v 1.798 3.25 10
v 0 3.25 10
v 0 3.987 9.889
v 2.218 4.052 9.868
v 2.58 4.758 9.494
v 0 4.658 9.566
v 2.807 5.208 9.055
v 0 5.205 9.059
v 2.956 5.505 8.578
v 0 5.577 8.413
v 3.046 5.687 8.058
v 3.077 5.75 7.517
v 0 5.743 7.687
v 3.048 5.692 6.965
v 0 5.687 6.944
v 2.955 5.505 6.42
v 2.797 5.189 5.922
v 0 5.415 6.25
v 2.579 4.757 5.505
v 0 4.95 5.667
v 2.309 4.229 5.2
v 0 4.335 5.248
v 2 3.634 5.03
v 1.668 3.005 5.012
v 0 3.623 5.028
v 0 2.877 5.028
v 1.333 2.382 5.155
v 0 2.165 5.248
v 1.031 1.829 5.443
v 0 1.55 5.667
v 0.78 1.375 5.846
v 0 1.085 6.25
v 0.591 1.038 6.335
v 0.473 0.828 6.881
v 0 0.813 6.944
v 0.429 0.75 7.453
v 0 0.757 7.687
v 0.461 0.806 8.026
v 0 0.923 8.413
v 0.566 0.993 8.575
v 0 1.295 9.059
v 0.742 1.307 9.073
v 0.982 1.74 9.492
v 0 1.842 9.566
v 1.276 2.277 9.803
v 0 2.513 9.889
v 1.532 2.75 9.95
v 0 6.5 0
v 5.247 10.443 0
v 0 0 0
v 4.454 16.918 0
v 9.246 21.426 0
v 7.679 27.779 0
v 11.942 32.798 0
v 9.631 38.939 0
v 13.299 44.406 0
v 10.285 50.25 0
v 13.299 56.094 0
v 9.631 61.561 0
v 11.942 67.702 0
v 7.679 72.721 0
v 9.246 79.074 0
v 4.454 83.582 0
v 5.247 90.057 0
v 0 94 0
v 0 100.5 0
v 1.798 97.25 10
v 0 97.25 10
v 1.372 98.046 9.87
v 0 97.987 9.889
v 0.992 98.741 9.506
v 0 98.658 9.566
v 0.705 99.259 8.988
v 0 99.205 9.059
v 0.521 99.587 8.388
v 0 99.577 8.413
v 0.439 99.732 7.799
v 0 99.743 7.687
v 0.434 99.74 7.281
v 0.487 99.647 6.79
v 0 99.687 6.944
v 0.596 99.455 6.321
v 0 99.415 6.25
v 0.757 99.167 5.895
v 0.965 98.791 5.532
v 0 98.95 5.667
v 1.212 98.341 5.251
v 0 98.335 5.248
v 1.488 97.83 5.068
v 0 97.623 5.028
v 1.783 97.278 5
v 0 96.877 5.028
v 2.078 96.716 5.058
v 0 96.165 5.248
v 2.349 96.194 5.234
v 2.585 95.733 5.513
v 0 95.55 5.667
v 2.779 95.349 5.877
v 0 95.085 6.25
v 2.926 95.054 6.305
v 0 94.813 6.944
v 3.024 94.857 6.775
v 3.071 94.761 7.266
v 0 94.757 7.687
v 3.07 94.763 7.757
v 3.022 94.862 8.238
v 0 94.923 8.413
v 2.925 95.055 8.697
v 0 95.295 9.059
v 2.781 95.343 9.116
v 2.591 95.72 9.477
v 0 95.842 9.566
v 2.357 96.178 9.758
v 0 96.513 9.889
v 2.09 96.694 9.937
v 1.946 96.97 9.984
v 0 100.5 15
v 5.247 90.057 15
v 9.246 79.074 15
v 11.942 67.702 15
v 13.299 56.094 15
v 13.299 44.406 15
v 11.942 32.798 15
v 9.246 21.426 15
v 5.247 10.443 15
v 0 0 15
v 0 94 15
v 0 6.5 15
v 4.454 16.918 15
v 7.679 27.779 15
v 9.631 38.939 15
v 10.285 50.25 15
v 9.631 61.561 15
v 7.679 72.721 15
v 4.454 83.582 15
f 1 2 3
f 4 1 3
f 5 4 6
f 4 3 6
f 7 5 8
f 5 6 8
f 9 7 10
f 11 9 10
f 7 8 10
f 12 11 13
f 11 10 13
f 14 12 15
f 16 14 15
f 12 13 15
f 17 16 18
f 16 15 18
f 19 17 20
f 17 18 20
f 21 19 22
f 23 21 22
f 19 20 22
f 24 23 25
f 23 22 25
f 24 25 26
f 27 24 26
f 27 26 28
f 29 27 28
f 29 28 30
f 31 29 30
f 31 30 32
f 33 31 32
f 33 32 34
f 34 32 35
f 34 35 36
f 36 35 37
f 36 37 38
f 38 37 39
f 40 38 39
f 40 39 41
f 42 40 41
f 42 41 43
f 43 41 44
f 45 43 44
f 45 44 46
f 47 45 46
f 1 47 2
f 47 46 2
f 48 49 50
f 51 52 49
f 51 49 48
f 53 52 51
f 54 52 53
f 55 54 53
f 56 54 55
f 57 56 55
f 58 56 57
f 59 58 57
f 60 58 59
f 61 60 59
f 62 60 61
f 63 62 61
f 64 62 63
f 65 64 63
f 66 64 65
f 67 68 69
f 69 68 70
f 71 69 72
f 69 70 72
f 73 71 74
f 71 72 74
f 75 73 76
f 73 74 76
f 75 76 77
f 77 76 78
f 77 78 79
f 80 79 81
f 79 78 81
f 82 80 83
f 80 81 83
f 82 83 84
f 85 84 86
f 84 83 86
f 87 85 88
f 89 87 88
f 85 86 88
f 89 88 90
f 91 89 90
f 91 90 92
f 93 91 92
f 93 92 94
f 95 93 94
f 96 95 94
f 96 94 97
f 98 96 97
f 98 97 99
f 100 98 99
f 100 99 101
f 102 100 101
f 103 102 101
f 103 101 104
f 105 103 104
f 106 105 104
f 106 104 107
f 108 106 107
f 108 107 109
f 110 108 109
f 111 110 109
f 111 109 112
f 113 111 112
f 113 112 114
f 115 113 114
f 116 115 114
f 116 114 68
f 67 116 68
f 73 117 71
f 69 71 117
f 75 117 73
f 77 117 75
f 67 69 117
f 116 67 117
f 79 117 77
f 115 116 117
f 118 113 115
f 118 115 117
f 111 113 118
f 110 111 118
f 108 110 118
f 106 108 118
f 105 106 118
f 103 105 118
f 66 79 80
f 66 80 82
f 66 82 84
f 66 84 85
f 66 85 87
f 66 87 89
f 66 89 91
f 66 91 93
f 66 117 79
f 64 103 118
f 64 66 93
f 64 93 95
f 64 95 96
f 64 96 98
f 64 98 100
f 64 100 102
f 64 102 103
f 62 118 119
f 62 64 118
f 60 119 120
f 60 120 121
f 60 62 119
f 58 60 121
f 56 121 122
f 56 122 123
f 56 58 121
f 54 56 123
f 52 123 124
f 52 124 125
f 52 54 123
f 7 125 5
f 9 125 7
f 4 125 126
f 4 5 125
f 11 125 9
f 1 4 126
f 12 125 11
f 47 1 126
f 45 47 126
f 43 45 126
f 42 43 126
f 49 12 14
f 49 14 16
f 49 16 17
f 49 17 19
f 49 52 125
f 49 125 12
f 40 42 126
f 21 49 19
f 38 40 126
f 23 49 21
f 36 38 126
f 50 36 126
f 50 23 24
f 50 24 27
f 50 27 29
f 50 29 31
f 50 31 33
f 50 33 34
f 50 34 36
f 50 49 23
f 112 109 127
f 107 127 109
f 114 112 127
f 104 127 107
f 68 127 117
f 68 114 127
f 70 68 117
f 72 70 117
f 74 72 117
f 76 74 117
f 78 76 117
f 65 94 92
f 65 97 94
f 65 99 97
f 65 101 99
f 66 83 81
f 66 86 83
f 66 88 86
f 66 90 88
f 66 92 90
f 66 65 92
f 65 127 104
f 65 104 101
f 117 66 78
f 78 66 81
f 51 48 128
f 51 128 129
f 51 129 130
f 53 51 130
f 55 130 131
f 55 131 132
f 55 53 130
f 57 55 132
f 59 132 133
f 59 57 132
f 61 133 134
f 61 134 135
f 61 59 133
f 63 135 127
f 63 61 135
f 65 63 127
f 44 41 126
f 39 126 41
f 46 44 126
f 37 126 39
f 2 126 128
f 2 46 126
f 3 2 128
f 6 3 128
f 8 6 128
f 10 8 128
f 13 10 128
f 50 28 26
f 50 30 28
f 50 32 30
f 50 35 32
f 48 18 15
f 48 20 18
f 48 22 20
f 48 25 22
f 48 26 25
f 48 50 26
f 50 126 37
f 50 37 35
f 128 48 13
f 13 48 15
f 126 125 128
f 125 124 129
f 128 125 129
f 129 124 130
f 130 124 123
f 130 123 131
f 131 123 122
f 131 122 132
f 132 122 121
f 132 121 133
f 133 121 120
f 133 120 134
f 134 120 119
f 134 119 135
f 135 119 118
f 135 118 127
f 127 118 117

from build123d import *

# Parameters (mm, degrees)
BOSS_EXTRUDE1_DEPTH = 15
CUT_EXTRUDE1_REACH  = 15.469
SKETCH2_R           = 2.5


with BuildPart() as part:
    # Sketch1 → Boss-Extrude1 (new body)
    with BuildSketch(Plane.XY):
        with BuildLine():
            Line((0, 0), (0, 6.5))
            ThreePointArc((0, 6.5), (10.284515004, 50.25), (0, 94))
            Line((0, 94), (0, 100.5))
            ThreePointArc((0, 100.5), (13.469469939, 50.25), (0, 0))
        make_face()
    extrude(amount=BOSS_EXTRUDE1_DEPTH)

    # Sketch2 → Cut-Extrude1 (cut, up to next)
    with BuildSketch(Plane.ZY, mode=Mode.PRIVATE) as cut_extrude1_sk1:
        with Locations((7.5, 97.25)):
            Circle(SKETCH2_R)
    cut_extrude1_tool1 = extrude(cut_extrude1_sk1.sketch, amount=-CUT_EXTRUDE1_REACH, mode=Mode.PRIVATE) & part.part
    add(cut_extrude1_tool1.solids().sort_by_distance((0, 97.25, 7.5))[0], mode=Mode.SUBTRACT)
    # Sketch2 → Cut-Extrude1 (cut, up to next)
    with BuildSketch(Plane.ZY, mode=Mode.PRIVATE) as cut_extrude1_sk2:
        with Locations((7.5, 3.25)):
            Circle(SKETCH2_R)
    cut_extrude1_tool2 = extrude(cut_extrude1_sk2.sketch, amount=-CUT_EXTRUDE1_REACH, mode=Mode.PRIVATE) & part.part
    add(cut_extrude1_tool2.solids().sort_by_distance((0, 3.25, 7.5))[0], mode=Mode.SUBTRACT)


solid = part.part
